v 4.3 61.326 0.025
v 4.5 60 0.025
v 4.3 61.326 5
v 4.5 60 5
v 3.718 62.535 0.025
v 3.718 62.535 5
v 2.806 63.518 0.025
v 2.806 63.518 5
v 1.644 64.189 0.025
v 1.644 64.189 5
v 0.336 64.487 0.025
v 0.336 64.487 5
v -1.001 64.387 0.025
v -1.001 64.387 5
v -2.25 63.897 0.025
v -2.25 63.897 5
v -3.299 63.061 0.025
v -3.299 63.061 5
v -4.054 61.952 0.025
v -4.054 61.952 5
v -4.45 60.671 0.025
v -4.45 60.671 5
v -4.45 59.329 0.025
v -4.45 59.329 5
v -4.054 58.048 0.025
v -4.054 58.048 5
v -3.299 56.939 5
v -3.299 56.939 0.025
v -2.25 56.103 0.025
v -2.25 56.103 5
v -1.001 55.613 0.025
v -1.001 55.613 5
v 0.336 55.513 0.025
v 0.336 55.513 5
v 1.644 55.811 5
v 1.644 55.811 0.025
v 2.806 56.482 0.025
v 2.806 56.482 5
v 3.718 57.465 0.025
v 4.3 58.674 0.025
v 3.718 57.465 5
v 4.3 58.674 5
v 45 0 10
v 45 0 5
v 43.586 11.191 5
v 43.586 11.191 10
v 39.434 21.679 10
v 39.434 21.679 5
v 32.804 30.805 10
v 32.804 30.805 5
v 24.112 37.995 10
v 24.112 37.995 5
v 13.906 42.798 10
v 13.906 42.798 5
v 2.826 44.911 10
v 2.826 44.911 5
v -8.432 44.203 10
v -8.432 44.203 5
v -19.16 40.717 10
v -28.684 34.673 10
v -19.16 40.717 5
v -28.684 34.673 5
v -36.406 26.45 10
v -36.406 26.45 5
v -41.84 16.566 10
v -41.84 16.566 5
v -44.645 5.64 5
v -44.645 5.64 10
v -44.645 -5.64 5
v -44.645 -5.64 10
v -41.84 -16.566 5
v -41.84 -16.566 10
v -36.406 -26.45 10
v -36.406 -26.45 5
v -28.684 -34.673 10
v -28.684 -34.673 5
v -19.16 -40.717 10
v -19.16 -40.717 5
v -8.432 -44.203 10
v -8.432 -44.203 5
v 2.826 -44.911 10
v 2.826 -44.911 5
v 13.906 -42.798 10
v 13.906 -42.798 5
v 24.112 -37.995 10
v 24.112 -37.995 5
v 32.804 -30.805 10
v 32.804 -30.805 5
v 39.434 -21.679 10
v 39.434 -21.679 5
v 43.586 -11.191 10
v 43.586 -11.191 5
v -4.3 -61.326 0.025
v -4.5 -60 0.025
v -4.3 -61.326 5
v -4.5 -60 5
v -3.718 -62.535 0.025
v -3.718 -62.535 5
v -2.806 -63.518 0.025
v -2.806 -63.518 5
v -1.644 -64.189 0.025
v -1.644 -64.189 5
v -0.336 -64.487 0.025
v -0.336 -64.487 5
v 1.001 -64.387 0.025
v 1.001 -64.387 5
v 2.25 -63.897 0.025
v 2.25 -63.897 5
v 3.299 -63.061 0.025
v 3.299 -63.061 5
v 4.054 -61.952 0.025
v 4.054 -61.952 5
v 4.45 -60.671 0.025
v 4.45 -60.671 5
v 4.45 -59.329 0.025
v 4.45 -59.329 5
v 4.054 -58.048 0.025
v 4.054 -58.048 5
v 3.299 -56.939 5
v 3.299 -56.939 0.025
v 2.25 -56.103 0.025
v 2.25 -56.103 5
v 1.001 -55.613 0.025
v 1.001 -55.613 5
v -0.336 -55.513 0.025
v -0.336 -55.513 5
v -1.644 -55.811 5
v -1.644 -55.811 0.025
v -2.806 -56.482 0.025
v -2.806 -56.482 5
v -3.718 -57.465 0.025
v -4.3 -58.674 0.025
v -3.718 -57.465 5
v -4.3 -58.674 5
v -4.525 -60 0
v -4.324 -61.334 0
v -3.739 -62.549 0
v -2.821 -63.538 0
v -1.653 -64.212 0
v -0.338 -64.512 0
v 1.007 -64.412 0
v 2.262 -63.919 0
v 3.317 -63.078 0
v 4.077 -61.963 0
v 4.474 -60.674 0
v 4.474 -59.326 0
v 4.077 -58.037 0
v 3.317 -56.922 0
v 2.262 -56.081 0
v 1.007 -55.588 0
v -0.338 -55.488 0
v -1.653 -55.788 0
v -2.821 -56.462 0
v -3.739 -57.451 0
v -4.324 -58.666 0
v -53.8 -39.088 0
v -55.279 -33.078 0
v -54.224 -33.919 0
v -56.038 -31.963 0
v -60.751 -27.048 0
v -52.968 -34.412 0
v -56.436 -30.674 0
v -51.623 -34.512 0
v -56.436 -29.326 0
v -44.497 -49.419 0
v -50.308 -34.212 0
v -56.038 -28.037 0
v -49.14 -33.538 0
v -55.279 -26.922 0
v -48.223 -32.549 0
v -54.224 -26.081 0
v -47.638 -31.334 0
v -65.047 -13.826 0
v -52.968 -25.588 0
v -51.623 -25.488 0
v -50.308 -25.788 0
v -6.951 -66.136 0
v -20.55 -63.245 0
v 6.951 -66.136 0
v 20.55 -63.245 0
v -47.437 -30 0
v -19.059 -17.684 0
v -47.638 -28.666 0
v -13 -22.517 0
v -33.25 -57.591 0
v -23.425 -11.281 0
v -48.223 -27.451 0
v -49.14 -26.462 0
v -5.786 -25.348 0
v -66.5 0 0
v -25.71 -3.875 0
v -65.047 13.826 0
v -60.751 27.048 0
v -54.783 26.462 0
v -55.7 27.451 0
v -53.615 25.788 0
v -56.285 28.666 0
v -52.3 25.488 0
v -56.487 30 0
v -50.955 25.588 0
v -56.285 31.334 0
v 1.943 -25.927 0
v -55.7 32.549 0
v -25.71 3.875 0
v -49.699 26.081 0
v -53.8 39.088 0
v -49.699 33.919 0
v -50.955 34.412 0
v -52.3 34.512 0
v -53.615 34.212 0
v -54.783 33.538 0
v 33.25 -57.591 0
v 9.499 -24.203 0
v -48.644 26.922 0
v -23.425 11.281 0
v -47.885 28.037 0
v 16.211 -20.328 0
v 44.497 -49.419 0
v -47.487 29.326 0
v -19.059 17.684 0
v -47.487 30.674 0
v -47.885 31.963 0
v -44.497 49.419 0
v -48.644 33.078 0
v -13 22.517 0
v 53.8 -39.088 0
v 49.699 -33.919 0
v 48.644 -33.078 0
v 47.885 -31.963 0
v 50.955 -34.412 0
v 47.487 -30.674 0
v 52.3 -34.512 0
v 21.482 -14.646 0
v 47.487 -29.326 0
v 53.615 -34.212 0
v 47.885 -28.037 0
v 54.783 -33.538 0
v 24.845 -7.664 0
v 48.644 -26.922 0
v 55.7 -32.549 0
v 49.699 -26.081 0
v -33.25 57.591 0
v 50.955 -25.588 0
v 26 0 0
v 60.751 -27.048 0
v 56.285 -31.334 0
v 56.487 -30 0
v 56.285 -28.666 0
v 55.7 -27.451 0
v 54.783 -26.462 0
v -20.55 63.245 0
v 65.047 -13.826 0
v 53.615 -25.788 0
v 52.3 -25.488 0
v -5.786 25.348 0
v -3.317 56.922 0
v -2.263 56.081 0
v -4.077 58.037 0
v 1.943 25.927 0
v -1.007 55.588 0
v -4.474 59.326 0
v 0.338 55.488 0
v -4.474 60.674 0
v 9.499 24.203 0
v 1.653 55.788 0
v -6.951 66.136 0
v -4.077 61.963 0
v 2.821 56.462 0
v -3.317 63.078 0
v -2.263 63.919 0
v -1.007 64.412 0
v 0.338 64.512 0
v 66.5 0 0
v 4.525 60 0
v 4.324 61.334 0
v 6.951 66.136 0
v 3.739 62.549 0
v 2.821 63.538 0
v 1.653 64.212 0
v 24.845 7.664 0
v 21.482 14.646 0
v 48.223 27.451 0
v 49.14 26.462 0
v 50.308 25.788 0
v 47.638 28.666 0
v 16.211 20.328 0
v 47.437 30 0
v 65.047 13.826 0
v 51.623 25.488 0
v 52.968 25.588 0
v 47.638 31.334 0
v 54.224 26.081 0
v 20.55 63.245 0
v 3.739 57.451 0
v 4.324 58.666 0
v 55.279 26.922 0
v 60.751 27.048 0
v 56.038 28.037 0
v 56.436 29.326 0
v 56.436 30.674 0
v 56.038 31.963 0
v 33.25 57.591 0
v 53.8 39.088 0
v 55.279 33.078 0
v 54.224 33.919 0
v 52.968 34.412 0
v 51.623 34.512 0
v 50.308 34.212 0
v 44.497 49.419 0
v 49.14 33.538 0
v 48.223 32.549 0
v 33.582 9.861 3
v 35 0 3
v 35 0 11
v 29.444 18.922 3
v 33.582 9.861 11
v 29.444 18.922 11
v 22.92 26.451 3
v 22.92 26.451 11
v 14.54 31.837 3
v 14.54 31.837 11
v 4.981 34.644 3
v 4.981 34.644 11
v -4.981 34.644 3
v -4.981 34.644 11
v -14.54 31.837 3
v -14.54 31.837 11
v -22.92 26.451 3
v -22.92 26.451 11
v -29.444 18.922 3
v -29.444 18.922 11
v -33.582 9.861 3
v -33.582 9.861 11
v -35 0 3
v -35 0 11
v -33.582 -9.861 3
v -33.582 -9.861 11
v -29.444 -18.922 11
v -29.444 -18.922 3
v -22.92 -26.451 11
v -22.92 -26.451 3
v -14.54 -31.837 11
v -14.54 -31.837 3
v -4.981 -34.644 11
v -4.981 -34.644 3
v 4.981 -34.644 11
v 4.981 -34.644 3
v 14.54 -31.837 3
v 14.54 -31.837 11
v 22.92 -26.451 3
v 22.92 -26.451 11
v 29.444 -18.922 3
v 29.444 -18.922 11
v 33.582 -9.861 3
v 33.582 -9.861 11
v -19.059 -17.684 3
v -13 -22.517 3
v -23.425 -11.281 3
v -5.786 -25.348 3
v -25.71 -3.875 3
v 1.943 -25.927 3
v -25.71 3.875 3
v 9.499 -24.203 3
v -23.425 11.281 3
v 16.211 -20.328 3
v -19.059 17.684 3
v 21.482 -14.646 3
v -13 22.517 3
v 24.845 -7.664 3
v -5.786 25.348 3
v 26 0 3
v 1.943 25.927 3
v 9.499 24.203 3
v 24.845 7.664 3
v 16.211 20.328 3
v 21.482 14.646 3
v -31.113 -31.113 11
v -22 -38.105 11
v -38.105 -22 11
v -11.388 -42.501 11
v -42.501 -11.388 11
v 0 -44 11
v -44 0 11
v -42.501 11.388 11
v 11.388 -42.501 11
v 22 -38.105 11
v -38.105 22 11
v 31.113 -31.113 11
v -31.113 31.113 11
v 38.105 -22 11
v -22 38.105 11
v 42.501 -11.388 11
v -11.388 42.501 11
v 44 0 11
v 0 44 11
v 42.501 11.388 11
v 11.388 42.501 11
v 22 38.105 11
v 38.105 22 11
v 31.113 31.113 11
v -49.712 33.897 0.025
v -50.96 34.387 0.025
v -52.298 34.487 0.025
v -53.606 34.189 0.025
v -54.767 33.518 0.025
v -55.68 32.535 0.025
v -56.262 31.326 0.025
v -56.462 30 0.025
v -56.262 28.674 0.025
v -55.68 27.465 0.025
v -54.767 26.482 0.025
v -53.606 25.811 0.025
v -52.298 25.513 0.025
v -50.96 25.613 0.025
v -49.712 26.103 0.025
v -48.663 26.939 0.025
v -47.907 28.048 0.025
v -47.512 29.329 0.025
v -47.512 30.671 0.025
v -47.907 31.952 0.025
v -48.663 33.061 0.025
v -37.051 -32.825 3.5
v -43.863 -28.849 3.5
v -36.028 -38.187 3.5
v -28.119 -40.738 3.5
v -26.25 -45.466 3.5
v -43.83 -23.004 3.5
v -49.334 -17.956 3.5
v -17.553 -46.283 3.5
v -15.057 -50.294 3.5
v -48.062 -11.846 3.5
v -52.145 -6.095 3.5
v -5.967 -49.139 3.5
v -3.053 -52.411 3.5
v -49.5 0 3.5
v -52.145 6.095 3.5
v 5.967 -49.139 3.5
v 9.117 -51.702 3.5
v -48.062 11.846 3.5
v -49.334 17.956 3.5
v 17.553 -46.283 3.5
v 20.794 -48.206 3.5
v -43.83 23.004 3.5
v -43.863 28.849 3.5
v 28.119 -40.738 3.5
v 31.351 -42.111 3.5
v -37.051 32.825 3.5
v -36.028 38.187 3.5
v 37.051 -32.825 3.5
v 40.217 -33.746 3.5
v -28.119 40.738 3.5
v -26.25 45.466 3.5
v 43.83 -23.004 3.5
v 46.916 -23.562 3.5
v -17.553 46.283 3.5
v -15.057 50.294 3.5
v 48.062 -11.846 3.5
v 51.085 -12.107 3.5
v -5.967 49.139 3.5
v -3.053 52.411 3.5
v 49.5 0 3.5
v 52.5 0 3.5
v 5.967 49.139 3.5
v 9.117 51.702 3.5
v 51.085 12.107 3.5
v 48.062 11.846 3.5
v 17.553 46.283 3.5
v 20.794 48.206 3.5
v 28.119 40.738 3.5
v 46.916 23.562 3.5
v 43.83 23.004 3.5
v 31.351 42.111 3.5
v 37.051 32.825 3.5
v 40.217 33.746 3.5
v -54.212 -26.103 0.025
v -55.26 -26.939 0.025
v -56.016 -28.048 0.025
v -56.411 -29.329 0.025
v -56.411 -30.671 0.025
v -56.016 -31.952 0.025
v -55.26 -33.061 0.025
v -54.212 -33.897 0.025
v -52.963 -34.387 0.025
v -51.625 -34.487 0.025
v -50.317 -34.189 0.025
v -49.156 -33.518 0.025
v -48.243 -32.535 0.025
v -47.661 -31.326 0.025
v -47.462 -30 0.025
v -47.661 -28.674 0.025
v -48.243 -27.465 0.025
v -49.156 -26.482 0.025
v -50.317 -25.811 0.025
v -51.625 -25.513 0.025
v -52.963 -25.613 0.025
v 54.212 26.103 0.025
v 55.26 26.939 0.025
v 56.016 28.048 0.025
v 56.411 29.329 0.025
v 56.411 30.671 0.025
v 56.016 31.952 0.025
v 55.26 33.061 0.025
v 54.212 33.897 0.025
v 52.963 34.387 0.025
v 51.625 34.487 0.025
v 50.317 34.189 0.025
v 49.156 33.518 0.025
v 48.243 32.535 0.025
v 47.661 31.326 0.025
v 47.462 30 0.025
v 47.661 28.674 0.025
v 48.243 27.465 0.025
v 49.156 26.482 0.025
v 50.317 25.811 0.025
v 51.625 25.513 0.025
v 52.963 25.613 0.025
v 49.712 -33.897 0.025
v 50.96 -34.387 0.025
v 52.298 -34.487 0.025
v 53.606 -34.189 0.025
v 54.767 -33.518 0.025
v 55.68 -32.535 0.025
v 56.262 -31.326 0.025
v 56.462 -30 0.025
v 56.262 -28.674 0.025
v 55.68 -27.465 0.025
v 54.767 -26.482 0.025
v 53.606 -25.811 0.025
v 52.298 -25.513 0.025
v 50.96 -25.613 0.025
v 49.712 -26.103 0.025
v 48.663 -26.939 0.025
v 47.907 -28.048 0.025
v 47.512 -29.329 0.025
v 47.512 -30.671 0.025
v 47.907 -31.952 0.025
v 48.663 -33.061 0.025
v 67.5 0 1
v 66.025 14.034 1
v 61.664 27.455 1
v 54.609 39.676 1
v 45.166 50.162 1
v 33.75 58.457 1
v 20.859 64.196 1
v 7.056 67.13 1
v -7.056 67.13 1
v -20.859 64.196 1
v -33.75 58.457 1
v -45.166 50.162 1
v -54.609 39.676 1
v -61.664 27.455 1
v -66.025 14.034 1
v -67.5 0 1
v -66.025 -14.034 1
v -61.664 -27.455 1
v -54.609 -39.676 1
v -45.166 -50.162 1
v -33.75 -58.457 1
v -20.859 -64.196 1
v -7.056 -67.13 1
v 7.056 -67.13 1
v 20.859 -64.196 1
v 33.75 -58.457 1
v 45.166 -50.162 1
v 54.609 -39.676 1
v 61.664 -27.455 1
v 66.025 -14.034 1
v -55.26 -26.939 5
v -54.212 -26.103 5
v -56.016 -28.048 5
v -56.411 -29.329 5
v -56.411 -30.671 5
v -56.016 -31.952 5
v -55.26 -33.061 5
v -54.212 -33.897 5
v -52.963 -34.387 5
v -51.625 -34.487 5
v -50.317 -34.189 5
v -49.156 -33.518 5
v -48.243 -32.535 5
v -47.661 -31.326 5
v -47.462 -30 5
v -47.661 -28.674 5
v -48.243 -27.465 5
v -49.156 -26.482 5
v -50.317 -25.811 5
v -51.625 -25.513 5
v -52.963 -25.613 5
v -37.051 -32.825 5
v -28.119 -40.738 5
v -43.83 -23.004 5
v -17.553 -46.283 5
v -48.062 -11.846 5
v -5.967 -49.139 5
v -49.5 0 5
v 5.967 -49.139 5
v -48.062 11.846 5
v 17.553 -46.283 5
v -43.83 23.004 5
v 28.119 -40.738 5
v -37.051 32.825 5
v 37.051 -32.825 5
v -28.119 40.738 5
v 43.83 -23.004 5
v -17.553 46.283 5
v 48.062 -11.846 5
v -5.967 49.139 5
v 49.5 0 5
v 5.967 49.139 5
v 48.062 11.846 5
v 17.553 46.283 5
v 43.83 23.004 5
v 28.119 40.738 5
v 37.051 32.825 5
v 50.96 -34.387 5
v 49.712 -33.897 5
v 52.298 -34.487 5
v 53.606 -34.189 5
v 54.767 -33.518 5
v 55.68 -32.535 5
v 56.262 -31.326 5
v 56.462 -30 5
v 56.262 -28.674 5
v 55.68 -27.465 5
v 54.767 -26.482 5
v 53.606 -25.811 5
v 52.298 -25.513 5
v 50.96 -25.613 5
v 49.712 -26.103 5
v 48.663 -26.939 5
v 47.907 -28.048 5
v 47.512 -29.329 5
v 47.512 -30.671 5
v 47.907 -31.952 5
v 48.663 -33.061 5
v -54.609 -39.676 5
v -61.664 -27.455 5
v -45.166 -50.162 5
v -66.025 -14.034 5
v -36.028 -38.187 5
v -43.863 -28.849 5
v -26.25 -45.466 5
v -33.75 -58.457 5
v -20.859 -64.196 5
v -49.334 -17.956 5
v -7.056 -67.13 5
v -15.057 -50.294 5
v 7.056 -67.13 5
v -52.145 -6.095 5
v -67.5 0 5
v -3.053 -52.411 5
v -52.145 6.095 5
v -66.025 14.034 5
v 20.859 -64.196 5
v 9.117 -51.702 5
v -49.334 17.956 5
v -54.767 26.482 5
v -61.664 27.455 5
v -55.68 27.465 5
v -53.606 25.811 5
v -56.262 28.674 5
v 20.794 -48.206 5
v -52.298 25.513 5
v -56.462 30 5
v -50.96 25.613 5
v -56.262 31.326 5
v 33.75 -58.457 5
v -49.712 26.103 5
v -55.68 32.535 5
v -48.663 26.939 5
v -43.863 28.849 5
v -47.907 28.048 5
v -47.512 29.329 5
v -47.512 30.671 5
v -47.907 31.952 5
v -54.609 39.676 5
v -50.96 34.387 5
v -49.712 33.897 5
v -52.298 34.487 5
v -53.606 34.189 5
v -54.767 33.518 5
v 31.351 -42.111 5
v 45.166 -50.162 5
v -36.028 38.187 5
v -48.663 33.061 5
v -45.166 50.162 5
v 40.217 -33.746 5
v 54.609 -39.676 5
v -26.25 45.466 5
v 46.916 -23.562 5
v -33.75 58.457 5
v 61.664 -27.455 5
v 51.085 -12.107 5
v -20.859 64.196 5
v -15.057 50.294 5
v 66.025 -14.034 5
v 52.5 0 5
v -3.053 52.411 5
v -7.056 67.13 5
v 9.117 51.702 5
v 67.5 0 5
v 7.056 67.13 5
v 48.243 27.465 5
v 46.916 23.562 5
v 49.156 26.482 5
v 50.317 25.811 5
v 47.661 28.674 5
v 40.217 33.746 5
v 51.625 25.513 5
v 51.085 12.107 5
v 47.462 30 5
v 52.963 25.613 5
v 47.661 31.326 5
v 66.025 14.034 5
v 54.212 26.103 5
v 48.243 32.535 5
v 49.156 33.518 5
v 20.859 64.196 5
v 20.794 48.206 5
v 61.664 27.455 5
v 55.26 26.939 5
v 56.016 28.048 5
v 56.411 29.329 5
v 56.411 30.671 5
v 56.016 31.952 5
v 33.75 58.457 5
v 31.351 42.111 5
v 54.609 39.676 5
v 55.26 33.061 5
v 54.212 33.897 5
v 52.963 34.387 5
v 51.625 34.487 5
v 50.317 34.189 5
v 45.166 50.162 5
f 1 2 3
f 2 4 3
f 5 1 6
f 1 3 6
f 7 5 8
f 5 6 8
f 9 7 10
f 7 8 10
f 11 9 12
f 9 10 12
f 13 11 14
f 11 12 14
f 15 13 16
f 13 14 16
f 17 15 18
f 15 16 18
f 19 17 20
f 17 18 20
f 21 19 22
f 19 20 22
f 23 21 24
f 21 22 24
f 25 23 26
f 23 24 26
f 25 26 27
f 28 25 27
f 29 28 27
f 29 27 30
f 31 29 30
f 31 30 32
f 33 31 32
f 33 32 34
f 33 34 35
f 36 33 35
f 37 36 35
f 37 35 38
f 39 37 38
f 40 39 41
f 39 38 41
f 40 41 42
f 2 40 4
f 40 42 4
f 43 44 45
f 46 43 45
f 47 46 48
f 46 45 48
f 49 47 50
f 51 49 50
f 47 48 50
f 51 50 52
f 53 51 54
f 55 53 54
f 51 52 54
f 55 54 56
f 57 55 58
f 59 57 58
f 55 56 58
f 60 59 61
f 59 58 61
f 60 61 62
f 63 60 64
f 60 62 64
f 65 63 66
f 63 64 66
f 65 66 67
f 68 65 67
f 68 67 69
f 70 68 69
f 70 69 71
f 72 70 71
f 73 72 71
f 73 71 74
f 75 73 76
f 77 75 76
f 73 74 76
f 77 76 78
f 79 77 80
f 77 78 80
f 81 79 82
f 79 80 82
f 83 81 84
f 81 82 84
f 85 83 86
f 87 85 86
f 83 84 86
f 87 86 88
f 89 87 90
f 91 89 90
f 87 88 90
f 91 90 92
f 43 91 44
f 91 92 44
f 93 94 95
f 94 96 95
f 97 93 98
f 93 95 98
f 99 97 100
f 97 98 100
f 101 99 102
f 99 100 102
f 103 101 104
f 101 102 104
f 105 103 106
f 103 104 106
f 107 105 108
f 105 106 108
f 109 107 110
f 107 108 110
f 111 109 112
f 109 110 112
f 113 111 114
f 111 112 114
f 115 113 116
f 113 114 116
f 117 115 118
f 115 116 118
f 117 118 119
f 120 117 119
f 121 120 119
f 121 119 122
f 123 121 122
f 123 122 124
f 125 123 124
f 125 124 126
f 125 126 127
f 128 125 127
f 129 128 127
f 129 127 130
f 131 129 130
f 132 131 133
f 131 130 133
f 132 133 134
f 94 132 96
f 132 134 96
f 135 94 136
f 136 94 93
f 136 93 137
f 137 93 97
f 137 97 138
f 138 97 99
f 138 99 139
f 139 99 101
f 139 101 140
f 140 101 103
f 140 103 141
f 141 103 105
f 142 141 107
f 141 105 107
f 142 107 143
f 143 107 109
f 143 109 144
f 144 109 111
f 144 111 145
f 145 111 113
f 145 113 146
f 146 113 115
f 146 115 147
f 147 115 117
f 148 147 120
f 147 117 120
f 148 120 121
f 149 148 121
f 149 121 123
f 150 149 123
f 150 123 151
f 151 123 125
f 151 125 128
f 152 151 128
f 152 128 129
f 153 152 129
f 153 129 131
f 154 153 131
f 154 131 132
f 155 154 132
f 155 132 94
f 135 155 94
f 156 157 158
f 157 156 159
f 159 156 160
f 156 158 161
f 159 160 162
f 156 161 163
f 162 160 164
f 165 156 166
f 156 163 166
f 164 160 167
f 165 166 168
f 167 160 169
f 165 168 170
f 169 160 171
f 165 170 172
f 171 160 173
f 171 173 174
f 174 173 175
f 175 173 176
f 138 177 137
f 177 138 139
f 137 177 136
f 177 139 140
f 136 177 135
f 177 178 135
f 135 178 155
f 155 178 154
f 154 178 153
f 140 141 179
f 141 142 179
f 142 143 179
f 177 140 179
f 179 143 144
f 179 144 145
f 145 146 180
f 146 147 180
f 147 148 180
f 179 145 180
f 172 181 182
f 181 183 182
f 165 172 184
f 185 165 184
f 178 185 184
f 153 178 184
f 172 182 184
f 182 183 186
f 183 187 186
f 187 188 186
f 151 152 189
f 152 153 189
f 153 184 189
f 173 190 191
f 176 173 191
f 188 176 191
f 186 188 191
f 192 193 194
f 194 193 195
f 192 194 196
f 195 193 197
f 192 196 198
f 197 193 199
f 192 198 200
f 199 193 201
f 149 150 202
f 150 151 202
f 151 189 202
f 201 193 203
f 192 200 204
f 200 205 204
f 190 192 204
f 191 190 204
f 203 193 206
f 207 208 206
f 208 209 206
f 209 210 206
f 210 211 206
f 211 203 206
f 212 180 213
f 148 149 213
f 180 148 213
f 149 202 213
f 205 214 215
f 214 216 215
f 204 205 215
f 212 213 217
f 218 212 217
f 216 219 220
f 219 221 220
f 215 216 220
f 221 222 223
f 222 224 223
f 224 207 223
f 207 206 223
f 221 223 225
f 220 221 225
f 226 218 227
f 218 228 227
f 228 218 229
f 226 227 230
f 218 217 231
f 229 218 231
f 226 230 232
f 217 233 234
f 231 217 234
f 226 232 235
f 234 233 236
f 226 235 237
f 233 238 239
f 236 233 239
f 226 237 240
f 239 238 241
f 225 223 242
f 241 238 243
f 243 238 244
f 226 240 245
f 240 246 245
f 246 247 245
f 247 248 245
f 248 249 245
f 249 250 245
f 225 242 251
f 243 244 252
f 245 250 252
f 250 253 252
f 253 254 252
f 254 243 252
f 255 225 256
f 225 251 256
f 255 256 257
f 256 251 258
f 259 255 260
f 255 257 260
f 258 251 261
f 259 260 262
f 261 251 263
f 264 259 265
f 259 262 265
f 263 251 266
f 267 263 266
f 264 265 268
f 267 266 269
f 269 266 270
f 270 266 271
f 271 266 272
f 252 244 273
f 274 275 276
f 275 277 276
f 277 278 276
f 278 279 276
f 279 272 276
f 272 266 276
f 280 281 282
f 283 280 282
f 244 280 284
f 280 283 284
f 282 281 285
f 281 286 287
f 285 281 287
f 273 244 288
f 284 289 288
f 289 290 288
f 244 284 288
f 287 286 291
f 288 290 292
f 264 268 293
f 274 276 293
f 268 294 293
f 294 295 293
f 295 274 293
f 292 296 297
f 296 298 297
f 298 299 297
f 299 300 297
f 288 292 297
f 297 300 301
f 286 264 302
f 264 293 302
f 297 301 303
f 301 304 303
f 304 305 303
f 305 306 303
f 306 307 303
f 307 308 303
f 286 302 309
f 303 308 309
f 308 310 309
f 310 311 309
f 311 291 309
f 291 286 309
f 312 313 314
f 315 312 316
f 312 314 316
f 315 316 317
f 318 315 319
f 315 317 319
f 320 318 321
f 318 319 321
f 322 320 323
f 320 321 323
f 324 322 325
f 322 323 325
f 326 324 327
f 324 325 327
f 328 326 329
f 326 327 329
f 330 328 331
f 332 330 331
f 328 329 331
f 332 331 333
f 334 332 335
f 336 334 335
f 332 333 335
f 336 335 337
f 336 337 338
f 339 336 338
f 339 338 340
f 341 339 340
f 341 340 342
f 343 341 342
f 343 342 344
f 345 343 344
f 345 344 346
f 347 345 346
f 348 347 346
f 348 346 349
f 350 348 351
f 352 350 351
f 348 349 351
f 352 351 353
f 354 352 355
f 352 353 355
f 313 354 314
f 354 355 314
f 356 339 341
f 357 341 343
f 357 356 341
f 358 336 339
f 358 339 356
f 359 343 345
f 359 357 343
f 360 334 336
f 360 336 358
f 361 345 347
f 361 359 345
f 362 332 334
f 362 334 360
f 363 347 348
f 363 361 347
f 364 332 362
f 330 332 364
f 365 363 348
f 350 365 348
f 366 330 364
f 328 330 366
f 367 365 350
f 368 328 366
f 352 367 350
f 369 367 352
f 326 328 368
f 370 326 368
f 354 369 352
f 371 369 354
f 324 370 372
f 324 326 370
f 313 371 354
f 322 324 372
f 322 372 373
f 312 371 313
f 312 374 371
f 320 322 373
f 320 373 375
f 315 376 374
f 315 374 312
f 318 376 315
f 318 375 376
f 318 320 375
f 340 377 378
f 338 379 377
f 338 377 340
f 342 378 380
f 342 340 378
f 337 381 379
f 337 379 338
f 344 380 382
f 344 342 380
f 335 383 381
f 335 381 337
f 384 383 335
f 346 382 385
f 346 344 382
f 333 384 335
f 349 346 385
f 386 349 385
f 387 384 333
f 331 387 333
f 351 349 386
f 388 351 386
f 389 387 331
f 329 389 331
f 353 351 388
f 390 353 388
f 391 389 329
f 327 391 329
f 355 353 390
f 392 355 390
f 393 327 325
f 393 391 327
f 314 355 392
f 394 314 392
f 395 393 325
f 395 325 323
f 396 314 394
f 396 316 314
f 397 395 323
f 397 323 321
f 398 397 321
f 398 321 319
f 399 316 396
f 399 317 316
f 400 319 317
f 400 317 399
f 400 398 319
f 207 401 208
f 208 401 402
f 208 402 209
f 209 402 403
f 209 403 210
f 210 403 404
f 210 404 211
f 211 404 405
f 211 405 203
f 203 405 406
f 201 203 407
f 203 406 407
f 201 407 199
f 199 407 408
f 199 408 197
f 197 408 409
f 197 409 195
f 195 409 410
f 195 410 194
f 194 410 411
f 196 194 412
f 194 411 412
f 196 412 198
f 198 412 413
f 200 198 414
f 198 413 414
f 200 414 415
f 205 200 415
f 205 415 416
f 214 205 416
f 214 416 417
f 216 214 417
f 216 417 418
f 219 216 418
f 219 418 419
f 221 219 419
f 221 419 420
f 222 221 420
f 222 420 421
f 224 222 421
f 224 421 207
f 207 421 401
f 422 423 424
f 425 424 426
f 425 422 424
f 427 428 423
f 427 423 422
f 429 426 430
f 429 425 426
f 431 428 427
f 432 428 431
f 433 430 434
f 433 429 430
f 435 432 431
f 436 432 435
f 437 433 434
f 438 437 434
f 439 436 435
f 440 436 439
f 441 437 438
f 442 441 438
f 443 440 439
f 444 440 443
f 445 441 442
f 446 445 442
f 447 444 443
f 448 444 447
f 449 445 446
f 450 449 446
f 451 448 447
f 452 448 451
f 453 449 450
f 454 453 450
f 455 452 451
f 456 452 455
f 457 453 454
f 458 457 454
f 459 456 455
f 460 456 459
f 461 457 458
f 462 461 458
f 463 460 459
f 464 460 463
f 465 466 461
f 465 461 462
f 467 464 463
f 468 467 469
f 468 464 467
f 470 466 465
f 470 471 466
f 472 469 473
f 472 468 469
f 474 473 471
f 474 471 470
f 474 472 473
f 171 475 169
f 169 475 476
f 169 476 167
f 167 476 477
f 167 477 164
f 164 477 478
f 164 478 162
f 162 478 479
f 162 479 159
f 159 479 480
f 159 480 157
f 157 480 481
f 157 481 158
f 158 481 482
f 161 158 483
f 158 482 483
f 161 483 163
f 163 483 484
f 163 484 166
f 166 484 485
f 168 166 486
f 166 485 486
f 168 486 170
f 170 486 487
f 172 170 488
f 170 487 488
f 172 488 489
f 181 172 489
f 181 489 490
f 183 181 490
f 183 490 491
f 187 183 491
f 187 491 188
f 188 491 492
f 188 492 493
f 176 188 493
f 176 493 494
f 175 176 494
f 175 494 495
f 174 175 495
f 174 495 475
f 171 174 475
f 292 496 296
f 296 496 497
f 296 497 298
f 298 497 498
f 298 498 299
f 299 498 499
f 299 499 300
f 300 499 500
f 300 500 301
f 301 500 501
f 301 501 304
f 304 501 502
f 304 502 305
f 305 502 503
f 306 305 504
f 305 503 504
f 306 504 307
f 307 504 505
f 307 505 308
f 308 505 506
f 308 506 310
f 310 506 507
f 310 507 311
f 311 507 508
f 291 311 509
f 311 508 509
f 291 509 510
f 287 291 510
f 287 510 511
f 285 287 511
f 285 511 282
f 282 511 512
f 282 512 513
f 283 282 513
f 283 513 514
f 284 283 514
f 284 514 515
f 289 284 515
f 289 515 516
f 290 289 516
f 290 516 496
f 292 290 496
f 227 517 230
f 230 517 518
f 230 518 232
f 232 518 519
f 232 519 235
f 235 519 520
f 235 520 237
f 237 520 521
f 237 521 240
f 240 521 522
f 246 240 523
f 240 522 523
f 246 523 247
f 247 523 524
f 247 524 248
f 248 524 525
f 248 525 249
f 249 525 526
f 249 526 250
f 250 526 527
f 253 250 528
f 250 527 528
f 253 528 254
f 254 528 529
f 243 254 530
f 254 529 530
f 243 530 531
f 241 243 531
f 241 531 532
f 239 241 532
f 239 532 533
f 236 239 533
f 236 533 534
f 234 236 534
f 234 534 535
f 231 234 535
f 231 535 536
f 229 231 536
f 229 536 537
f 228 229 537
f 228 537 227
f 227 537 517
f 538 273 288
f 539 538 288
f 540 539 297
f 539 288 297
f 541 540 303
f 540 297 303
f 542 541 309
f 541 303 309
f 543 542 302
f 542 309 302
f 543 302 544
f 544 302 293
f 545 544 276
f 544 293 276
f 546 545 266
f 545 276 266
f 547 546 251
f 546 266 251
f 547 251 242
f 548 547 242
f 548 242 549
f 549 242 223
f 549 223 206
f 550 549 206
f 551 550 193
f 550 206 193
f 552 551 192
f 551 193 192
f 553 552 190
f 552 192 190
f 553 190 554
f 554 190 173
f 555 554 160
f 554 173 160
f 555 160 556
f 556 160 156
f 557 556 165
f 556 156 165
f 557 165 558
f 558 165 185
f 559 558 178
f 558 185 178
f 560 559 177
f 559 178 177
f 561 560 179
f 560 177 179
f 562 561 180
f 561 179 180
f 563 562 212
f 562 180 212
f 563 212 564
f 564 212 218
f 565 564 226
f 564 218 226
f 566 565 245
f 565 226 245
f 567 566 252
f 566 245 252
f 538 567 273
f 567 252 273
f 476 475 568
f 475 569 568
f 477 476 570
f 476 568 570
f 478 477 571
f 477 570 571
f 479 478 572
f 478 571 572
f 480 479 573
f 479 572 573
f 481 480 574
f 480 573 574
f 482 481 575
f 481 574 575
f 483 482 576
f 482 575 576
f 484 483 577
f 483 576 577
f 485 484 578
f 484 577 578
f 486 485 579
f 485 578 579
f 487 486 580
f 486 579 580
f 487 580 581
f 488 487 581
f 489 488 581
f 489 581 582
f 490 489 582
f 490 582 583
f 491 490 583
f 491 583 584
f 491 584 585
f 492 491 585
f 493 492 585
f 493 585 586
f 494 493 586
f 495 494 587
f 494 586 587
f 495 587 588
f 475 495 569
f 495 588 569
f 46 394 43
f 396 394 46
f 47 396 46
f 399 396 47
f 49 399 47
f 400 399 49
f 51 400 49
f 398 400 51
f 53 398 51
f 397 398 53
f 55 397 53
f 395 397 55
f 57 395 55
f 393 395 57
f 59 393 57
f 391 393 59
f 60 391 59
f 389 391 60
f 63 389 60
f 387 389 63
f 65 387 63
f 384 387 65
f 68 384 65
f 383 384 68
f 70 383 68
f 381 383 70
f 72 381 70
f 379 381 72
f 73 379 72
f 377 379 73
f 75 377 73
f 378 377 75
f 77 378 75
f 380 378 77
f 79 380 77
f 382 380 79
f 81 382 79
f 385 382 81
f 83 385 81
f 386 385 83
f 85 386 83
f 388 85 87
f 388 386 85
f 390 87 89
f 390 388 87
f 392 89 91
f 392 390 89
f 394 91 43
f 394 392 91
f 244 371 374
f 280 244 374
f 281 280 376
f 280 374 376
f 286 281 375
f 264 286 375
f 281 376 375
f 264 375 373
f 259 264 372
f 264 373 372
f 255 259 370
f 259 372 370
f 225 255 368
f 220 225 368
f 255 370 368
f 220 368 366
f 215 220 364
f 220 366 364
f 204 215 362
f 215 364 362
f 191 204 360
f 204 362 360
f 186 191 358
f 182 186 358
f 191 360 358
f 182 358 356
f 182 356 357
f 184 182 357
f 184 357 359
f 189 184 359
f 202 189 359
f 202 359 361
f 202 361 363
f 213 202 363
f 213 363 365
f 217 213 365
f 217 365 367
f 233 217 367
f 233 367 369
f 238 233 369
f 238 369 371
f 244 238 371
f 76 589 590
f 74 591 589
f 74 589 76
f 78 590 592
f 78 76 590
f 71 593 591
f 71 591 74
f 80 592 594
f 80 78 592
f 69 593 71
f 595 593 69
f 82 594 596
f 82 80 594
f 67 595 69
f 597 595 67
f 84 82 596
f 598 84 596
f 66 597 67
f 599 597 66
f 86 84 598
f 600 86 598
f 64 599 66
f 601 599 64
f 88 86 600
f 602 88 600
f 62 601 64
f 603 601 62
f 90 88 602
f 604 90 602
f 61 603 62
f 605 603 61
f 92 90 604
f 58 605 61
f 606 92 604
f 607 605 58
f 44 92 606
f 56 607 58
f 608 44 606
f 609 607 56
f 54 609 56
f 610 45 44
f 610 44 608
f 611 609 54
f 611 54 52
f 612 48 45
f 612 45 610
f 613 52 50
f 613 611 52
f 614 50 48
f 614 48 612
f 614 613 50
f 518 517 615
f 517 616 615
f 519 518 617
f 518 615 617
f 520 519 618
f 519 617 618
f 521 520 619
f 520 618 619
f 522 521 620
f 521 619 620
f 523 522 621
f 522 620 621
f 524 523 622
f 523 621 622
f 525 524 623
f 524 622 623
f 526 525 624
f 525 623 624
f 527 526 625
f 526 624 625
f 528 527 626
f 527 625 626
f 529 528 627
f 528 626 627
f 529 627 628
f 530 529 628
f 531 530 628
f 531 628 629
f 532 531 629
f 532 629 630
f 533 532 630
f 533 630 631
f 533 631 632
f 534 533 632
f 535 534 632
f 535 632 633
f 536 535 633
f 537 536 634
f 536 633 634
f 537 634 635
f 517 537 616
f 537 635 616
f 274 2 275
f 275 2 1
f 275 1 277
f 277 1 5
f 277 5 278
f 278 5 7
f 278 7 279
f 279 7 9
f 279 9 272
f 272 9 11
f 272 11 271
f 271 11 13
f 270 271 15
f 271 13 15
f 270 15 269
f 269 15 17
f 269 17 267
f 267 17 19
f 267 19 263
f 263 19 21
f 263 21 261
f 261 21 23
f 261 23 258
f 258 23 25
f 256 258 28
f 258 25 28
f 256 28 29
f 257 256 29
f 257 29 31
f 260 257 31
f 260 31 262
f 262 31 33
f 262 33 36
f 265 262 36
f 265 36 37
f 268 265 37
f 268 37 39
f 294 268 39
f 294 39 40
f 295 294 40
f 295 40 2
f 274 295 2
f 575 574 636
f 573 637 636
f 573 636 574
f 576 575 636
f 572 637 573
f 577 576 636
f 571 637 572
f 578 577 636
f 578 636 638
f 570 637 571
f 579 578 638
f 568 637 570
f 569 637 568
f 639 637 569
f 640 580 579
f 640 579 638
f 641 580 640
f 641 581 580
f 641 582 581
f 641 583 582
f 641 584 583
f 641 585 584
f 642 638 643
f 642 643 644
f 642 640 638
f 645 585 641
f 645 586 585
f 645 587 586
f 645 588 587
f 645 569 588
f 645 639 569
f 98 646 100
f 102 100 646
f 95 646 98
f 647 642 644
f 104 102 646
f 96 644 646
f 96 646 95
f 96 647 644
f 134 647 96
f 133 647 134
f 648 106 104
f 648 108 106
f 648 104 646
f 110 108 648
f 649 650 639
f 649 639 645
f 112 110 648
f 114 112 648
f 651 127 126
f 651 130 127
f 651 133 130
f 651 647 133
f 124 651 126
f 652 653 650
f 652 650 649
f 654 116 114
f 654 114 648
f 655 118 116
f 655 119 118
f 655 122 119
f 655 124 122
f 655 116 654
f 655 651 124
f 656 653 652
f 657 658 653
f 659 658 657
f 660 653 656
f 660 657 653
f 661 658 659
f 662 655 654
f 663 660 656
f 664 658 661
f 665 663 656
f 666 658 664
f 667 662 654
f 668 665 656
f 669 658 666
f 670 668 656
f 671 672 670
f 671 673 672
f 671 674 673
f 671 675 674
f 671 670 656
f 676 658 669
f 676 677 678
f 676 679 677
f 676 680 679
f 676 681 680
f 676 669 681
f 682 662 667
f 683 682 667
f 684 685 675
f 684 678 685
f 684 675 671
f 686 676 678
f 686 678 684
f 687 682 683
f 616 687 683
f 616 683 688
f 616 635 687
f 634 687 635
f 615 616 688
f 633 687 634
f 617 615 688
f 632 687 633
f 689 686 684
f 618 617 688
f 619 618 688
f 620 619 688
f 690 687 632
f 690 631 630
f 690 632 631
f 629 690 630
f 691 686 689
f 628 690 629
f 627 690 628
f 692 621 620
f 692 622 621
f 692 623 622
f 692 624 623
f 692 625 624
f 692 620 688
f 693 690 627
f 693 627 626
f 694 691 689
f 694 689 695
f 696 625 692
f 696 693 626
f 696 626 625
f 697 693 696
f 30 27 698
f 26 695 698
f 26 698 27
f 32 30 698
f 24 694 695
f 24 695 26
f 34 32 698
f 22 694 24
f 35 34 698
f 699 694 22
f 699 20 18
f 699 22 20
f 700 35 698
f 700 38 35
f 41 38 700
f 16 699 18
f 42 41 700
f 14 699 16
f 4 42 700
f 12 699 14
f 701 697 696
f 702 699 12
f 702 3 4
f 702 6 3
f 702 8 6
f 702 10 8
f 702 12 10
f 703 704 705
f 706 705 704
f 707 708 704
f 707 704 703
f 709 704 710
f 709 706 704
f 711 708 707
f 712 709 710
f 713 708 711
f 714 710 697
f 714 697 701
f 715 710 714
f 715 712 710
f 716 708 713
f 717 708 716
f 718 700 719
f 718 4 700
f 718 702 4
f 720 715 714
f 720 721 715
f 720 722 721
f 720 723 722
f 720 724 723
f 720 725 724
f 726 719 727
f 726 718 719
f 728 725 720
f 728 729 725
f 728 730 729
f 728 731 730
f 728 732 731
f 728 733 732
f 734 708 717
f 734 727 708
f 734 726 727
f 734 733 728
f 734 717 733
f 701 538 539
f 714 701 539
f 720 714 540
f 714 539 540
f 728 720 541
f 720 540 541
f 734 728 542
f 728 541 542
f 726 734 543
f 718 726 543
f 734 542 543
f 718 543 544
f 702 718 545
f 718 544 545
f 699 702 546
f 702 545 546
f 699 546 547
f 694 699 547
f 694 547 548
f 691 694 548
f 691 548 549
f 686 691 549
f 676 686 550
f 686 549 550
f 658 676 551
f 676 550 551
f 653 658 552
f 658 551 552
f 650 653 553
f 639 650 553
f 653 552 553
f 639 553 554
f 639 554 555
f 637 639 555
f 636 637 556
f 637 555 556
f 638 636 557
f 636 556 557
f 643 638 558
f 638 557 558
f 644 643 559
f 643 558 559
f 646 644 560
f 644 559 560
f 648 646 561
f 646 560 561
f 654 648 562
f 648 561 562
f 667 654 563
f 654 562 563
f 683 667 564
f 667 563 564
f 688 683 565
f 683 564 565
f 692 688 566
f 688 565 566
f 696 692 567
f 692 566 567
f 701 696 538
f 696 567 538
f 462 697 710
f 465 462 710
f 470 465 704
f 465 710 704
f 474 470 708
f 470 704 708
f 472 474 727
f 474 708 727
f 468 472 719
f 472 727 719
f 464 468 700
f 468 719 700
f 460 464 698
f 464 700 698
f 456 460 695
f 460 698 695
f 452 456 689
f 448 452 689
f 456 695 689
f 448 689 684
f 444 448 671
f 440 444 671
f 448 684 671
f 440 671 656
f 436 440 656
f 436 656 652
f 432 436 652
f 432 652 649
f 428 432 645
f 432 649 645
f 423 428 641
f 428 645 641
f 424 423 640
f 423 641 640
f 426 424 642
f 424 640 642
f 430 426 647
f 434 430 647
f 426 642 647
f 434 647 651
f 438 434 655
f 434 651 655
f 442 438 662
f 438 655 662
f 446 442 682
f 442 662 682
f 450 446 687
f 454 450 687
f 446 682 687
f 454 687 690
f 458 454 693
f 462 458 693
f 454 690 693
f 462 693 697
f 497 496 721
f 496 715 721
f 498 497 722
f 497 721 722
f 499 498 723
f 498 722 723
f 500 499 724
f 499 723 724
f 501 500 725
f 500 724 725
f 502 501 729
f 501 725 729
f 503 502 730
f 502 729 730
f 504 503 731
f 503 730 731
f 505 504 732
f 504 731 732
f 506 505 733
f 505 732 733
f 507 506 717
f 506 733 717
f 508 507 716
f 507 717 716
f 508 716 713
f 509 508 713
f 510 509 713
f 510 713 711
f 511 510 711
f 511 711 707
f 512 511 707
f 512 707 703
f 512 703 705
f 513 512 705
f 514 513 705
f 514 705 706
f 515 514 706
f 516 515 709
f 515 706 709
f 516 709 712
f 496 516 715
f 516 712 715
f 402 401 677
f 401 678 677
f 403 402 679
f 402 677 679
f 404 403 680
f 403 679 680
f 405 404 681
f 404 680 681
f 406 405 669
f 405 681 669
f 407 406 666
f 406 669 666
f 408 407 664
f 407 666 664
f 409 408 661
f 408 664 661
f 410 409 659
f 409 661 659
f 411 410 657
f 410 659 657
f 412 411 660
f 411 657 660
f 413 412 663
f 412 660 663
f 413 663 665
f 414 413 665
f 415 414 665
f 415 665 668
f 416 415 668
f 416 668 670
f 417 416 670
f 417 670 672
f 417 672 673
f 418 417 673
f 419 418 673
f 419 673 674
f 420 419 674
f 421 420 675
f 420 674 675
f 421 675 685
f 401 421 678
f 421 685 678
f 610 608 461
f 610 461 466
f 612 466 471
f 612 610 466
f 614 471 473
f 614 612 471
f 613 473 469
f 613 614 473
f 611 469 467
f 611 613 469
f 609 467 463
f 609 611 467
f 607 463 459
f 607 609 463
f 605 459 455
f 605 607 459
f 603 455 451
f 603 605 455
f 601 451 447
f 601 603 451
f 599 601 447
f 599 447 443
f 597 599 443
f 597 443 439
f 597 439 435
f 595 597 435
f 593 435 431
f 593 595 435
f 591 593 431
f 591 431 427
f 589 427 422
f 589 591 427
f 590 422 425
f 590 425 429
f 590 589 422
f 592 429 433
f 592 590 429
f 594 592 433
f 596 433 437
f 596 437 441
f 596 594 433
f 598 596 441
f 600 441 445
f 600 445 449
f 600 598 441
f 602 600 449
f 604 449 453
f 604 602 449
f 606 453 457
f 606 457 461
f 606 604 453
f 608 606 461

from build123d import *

# Parameters (mm, degrees)
SCHIZZO1_R                     = 67.5
ESTRUSIONE_ESTRUSIONE1_DEPTH   = 5
SCHIZZO2_R                     = 45
ESTRUSIONE_ESTRUSIONE2_DEPTH   = 6
SCHIZZO3_R                     = 35
TAGLIO_ESTRUSIONE1_DEPTH       = 8
SCHIZZO4_R                     = 26
TAGLIO_ESTRUSIONE2_DEPTH       = 4
SMUSSO1_SIZE                   = 1
FORO_PER_VITE_M8_1_D           = 9
FORO_PER_VITE_M8_1_CSINK_D     = 9.05
FORO_PER_VITE_M8_1_CSINK_ANGLE = 90
RIPETIZIONECIRCOLARE1_COUNT    = 6
SCHIZZO8_R                     = 52.5
SCHIZZO8_R_2                   = 49.5
TAGLIO_ESTRUSIONE3_DEPTH       = 1.5


with BuildPart() as part:
    # Schizzo1 → Estrusione-Estrusione1 (new body)
    with BuildSketch(Plane.XY):
        Circle(SCHIZZO1_R)
    extrude(amount=ESTRUSIONE_ESTRUSIONE1_DEPTH)

    # Schizzo2 → Estrusione-Estrusione2 (add)
    with BuildSketch(Plane.XY.offset(5)):
        Circle(SCHIZZO2_R)
    extrude(amount=ESTRUSIONE_ESTRUSIONE2_DEPTH)

    # Schizzo3 → Taglio-Estrusione1 (cut)
    with BuildSketch(Plane.XY.offset(11)):
        Circle(SCHIZZO3_R)
    extrude(amount=-TAGLIO_ESTRUSIONE1_DEPTH, mode=Mode.SUBTRACT)

    # Schizzo4 → Taglio-Estrusione2 (cut, through all)
    with BuildSketch(Plane.XY.offset(3)):
        Circle(SCHIZZO4_R)
    extrude(amount=-TAGLIO_ESTRUSIONE2_DEPTH, mode=Mode.SUBTRACT)

    # Smusso1
    smusso1_edges = [part.edges().sort_by_distance(p)[0] for p in [
        (-67.5, 0, 0),
        (-45, 0, 11),
    ]]
    chamfer(smusso1_edges, length=SMUSSO1_SIZE)

    # Foro per Vite M8-1 (through all)
    with Locations(Plane(origin=(0, 0, 0), x_dir=(-1, 0, 0), z_dir=(0, 0, -1))):
        with Locations((0, 60)):
            foro_per_vite_m8_1 = CounterSinkHole(FORO_PER_VITE_M8_1_D / 2, FORO_PER_VITE_M8_1_CSINK_D / 2, counter_sink_angle=FORO_PER_VITE_M8_1_CSINK_ANGLE)

    # RipetizioneCircolare1: Foro per Vite M8-1 ×6 about axis
    ripetizionecircolare1_axis = Axis((0, 0, 0), (0, 0, 1))
    for i in range(1, RIPETIZIONECIRCOLARE1_COUNT):
        add(foro_per_vite_m8_1.rotate(ripetizionecircolare1_axis, i * 360 / RIPETIZIONECIRCOLARE1_COUNT), mode=Mode.SUBTRACT)

    # Schizzo8 → Taglio-Estrusione3 (cut)
    with BuildSketch(Plane.XY.offset(5)):
        Circle(SCHIZZO8_R)
        Circle(SCHIZZO8_R_2, mode=Mode.SUBTRACT)
    extrude(amount=-TAGLIO_ESTRUSIONE3_DEPTH, mode=Mode.SUBTRACT)


solid = part.part
